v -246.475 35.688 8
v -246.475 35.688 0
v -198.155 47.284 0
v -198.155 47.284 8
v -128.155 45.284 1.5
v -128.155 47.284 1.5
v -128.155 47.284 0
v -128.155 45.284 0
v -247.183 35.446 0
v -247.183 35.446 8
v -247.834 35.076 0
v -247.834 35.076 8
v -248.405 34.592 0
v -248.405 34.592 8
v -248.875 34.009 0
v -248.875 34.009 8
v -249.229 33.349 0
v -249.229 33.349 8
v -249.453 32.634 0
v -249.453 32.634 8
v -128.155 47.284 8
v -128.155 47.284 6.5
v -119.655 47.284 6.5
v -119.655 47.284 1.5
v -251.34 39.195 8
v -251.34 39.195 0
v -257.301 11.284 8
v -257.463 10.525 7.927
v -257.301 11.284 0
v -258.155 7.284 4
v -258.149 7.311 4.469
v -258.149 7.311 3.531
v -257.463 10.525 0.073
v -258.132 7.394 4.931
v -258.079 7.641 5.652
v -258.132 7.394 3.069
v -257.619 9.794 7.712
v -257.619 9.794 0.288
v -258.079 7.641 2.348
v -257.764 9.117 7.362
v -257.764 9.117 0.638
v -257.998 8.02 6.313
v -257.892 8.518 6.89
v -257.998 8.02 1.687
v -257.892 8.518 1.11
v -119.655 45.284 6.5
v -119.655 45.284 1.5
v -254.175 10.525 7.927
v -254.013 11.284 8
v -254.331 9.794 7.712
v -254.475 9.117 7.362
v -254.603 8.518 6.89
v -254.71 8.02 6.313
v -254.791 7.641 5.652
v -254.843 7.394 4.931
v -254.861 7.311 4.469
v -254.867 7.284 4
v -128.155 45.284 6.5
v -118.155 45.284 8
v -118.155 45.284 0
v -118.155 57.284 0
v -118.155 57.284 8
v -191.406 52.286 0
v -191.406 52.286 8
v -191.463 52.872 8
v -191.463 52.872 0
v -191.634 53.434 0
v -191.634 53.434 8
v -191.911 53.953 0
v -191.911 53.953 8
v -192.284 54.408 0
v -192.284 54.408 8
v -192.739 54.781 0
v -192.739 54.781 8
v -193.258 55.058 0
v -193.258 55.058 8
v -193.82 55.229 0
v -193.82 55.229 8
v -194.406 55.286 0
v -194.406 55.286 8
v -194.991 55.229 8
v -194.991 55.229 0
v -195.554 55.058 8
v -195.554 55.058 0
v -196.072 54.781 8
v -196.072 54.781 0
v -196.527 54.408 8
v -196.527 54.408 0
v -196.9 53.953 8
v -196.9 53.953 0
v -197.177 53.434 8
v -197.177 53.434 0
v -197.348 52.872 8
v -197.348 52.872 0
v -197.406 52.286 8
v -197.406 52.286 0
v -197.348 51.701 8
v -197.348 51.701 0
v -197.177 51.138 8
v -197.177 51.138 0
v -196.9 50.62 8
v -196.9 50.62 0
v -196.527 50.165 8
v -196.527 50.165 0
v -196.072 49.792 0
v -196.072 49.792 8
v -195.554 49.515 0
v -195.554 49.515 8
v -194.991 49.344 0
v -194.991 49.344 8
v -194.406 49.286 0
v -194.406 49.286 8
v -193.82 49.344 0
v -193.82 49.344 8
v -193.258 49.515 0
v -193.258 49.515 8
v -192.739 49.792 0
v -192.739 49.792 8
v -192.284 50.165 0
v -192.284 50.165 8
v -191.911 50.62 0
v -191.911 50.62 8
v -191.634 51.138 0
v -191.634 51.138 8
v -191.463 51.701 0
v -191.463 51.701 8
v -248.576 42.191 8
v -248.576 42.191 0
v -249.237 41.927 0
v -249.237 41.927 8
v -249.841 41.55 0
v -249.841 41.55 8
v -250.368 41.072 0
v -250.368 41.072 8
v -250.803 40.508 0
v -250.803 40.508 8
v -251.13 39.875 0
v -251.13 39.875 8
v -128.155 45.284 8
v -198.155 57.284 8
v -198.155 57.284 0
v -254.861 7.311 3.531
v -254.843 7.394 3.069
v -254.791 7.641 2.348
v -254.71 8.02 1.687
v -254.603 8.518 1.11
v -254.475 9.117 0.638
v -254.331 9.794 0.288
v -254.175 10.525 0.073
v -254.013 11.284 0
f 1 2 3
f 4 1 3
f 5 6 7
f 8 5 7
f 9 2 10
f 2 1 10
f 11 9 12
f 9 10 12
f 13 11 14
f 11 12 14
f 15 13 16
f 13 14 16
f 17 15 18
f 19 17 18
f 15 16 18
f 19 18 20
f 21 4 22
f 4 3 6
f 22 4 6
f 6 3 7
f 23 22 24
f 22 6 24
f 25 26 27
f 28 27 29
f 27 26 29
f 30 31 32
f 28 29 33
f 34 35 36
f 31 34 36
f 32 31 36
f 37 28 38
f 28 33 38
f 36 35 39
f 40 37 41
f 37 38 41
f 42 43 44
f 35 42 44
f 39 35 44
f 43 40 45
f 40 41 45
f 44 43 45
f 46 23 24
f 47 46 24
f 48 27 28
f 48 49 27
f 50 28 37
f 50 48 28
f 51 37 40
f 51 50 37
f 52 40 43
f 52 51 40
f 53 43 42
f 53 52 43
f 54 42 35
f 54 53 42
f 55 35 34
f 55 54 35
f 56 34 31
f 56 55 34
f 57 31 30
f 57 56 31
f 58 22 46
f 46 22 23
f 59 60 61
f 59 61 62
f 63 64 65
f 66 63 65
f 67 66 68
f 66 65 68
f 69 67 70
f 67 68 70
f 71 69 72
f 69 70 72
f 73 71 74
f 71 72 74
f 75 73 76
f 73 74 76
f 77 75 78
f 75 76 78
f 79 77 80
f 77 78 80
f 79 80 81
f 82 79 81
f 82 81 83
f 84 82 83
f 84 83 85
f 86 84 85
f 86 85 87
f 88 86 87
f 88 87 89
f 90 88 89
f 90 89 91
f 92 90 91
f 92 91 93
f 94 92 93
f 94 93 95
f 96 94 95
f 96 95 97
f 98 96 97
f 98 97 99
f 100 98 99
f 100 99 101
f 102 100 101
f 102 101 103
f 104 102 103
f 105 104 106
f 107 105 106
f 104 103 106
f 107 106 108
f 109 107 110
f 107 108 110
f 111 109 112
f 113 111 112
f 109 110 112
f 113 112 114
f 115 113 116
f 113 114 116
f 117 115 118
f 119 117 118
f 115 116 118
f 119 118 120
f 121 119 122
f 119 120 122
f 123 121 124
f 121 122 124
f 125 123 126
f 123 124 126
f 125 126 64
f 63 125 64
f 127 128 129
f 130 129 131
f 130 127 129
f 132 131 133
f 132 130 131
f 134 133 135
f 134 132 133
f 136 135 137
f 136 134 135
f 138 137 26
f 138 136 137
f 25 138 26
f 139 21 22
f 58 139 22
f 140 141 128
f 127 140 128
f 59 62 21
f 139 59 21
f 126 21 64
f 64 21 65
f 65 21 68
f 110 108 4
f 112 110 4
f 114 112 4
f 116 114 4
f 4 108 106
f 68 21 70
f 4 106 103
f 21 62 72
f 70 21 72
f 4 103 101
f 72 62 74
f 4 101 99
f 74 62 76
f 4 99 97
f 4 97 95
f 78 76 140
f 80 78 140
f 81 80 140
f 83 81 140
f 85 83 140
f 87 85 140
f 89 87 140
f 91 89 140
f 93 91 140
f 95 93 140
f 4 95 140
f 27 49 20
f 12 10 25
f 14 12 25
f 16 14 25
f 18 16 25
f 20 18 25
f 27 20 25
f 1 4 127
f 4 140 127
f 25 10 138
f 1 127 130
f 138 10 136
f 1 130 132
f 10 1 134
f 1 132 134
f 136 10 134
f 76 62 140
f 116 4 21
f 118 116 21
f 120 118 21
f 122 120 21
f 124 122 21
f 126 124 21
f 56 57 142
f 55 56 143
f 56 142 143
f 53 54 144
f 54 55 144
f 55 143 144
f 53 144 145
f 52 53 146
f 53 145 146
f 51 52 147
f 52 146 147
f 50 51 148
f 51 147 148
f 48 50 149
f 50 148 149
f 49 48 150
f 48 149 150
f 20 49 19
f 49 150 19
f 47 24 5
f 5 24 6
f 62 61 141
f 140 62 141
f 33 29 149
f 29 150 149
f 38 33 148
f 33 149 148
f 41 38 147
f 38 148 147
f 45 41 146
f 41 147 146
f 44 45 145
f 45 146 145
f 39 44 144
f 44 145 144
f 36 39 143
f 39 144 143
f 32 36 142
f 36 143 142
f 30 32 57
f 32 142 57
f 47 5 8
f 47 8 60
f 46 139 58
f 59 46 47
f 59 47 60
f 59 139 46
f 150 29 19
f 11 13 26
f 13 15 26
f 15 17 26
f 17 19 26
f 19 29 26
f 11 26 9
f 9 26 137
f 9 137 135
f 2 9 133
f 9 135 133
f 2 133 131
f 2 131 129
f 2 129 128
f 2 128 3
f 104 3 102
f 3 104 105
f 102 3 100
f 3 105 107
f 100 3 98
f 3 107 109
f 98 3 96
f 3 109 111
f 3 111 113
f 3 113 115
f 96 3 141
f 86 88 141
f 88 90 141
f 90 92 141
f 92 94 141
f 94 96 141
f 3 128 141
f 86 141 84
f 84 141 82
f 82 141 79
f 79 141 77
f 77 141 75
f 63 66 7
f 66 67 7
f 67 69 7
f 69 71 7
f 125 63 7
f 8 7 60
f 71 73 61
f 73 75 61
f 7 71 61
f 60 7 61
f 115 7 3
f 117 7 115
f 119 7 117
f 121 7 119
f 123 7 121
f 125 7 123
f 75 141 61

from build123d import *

# Parameters (mm, degrees)
BOSS_EXTRUDE1_DEPTH = 8
SKETCH5_W           = 1.5
SKETCH5_H           = 2.448371941
BOSS_EXTRUDE4_DEPTH = 2
SKETCH6_R           = 3
CUT_EXTRUDE1_DEPTH  = 265.555525233
FILLET1_R           = 4


with BuildPart() as part:
    # Sketch1 → Boss-Extrude1 (new body)
    with BuildSketch(Plane.XY):
        Polygon((-118.155372005, 57.283765903), (-198.155372005, 57.283765903), (-250.845489232, 41.511906575), (-258.155372005, 7.283765903), (-254.866788986, 7.283765903), (-248.926231582, 35.100112729), (-198.155372005, 47.283765903), (-118.155372005, 47.283765903), align=None)
    extrude(amount=BOSS_EXTRUDE1_DEPTH)

    # Sketch5 → Boss-Extrude4 (add)
    with BuildSketch(Plane.XZ.offset(-47.283765903)):
        Polygon((-128.155372005, 6.5), (-119.655372005, 6.5), (-118.155372005, 6.5), (-118.155372005, 8), (-128.155372005, 8), align=None)
        Polygon((-119.655372005, 4.051628059), (-119.655372005, 3.948371941), (-118.155372005, 3.948371941), (-118.155372005, 6.5), (-119.655372005, 6.5), align=None)
        with Locations((-118.905372005, 2.724185971)):
            Rectangle(SKETCH5_W, SKETCH5_H)
        Polygon((-118.155372005, 1.5), (-119.655372005, 1.5), (-128.155372005, 1.5), (-128.155372005, 0), (-118.155372005, 0), align=None)
    extrude(amount=BOSS_EXTRUDE4_DEPTH)

    # Sketch6 → Cut-Extrude1 (cut, through all)
    with BuildSketch(Plane.XY.offset(8)):
        with Locations((-194.405761522, 52.286388284)):
            Circle(SKETCH6_R)
    extrude(amount=-CUT_EXTRUDE1_DEPTH, mode=Mode.SUBTRACT)

    # Fillet1
    fillet1_edges = [part.edges().sort_by_distance(p)[0] for p in [
        (-248.926231582, 35.100112729, 4),
        (-250.845489232, 41.511906575, 4),
        (-256.511080495, 7.283765903, 0),
        (-256.511080495, 7.283765903, 8),
    ]]
    fillet(fillet1_edges, radius=FILLET1_R - 0.0001)  # a hair under: the kernel refuses the full size


solid = part.part
